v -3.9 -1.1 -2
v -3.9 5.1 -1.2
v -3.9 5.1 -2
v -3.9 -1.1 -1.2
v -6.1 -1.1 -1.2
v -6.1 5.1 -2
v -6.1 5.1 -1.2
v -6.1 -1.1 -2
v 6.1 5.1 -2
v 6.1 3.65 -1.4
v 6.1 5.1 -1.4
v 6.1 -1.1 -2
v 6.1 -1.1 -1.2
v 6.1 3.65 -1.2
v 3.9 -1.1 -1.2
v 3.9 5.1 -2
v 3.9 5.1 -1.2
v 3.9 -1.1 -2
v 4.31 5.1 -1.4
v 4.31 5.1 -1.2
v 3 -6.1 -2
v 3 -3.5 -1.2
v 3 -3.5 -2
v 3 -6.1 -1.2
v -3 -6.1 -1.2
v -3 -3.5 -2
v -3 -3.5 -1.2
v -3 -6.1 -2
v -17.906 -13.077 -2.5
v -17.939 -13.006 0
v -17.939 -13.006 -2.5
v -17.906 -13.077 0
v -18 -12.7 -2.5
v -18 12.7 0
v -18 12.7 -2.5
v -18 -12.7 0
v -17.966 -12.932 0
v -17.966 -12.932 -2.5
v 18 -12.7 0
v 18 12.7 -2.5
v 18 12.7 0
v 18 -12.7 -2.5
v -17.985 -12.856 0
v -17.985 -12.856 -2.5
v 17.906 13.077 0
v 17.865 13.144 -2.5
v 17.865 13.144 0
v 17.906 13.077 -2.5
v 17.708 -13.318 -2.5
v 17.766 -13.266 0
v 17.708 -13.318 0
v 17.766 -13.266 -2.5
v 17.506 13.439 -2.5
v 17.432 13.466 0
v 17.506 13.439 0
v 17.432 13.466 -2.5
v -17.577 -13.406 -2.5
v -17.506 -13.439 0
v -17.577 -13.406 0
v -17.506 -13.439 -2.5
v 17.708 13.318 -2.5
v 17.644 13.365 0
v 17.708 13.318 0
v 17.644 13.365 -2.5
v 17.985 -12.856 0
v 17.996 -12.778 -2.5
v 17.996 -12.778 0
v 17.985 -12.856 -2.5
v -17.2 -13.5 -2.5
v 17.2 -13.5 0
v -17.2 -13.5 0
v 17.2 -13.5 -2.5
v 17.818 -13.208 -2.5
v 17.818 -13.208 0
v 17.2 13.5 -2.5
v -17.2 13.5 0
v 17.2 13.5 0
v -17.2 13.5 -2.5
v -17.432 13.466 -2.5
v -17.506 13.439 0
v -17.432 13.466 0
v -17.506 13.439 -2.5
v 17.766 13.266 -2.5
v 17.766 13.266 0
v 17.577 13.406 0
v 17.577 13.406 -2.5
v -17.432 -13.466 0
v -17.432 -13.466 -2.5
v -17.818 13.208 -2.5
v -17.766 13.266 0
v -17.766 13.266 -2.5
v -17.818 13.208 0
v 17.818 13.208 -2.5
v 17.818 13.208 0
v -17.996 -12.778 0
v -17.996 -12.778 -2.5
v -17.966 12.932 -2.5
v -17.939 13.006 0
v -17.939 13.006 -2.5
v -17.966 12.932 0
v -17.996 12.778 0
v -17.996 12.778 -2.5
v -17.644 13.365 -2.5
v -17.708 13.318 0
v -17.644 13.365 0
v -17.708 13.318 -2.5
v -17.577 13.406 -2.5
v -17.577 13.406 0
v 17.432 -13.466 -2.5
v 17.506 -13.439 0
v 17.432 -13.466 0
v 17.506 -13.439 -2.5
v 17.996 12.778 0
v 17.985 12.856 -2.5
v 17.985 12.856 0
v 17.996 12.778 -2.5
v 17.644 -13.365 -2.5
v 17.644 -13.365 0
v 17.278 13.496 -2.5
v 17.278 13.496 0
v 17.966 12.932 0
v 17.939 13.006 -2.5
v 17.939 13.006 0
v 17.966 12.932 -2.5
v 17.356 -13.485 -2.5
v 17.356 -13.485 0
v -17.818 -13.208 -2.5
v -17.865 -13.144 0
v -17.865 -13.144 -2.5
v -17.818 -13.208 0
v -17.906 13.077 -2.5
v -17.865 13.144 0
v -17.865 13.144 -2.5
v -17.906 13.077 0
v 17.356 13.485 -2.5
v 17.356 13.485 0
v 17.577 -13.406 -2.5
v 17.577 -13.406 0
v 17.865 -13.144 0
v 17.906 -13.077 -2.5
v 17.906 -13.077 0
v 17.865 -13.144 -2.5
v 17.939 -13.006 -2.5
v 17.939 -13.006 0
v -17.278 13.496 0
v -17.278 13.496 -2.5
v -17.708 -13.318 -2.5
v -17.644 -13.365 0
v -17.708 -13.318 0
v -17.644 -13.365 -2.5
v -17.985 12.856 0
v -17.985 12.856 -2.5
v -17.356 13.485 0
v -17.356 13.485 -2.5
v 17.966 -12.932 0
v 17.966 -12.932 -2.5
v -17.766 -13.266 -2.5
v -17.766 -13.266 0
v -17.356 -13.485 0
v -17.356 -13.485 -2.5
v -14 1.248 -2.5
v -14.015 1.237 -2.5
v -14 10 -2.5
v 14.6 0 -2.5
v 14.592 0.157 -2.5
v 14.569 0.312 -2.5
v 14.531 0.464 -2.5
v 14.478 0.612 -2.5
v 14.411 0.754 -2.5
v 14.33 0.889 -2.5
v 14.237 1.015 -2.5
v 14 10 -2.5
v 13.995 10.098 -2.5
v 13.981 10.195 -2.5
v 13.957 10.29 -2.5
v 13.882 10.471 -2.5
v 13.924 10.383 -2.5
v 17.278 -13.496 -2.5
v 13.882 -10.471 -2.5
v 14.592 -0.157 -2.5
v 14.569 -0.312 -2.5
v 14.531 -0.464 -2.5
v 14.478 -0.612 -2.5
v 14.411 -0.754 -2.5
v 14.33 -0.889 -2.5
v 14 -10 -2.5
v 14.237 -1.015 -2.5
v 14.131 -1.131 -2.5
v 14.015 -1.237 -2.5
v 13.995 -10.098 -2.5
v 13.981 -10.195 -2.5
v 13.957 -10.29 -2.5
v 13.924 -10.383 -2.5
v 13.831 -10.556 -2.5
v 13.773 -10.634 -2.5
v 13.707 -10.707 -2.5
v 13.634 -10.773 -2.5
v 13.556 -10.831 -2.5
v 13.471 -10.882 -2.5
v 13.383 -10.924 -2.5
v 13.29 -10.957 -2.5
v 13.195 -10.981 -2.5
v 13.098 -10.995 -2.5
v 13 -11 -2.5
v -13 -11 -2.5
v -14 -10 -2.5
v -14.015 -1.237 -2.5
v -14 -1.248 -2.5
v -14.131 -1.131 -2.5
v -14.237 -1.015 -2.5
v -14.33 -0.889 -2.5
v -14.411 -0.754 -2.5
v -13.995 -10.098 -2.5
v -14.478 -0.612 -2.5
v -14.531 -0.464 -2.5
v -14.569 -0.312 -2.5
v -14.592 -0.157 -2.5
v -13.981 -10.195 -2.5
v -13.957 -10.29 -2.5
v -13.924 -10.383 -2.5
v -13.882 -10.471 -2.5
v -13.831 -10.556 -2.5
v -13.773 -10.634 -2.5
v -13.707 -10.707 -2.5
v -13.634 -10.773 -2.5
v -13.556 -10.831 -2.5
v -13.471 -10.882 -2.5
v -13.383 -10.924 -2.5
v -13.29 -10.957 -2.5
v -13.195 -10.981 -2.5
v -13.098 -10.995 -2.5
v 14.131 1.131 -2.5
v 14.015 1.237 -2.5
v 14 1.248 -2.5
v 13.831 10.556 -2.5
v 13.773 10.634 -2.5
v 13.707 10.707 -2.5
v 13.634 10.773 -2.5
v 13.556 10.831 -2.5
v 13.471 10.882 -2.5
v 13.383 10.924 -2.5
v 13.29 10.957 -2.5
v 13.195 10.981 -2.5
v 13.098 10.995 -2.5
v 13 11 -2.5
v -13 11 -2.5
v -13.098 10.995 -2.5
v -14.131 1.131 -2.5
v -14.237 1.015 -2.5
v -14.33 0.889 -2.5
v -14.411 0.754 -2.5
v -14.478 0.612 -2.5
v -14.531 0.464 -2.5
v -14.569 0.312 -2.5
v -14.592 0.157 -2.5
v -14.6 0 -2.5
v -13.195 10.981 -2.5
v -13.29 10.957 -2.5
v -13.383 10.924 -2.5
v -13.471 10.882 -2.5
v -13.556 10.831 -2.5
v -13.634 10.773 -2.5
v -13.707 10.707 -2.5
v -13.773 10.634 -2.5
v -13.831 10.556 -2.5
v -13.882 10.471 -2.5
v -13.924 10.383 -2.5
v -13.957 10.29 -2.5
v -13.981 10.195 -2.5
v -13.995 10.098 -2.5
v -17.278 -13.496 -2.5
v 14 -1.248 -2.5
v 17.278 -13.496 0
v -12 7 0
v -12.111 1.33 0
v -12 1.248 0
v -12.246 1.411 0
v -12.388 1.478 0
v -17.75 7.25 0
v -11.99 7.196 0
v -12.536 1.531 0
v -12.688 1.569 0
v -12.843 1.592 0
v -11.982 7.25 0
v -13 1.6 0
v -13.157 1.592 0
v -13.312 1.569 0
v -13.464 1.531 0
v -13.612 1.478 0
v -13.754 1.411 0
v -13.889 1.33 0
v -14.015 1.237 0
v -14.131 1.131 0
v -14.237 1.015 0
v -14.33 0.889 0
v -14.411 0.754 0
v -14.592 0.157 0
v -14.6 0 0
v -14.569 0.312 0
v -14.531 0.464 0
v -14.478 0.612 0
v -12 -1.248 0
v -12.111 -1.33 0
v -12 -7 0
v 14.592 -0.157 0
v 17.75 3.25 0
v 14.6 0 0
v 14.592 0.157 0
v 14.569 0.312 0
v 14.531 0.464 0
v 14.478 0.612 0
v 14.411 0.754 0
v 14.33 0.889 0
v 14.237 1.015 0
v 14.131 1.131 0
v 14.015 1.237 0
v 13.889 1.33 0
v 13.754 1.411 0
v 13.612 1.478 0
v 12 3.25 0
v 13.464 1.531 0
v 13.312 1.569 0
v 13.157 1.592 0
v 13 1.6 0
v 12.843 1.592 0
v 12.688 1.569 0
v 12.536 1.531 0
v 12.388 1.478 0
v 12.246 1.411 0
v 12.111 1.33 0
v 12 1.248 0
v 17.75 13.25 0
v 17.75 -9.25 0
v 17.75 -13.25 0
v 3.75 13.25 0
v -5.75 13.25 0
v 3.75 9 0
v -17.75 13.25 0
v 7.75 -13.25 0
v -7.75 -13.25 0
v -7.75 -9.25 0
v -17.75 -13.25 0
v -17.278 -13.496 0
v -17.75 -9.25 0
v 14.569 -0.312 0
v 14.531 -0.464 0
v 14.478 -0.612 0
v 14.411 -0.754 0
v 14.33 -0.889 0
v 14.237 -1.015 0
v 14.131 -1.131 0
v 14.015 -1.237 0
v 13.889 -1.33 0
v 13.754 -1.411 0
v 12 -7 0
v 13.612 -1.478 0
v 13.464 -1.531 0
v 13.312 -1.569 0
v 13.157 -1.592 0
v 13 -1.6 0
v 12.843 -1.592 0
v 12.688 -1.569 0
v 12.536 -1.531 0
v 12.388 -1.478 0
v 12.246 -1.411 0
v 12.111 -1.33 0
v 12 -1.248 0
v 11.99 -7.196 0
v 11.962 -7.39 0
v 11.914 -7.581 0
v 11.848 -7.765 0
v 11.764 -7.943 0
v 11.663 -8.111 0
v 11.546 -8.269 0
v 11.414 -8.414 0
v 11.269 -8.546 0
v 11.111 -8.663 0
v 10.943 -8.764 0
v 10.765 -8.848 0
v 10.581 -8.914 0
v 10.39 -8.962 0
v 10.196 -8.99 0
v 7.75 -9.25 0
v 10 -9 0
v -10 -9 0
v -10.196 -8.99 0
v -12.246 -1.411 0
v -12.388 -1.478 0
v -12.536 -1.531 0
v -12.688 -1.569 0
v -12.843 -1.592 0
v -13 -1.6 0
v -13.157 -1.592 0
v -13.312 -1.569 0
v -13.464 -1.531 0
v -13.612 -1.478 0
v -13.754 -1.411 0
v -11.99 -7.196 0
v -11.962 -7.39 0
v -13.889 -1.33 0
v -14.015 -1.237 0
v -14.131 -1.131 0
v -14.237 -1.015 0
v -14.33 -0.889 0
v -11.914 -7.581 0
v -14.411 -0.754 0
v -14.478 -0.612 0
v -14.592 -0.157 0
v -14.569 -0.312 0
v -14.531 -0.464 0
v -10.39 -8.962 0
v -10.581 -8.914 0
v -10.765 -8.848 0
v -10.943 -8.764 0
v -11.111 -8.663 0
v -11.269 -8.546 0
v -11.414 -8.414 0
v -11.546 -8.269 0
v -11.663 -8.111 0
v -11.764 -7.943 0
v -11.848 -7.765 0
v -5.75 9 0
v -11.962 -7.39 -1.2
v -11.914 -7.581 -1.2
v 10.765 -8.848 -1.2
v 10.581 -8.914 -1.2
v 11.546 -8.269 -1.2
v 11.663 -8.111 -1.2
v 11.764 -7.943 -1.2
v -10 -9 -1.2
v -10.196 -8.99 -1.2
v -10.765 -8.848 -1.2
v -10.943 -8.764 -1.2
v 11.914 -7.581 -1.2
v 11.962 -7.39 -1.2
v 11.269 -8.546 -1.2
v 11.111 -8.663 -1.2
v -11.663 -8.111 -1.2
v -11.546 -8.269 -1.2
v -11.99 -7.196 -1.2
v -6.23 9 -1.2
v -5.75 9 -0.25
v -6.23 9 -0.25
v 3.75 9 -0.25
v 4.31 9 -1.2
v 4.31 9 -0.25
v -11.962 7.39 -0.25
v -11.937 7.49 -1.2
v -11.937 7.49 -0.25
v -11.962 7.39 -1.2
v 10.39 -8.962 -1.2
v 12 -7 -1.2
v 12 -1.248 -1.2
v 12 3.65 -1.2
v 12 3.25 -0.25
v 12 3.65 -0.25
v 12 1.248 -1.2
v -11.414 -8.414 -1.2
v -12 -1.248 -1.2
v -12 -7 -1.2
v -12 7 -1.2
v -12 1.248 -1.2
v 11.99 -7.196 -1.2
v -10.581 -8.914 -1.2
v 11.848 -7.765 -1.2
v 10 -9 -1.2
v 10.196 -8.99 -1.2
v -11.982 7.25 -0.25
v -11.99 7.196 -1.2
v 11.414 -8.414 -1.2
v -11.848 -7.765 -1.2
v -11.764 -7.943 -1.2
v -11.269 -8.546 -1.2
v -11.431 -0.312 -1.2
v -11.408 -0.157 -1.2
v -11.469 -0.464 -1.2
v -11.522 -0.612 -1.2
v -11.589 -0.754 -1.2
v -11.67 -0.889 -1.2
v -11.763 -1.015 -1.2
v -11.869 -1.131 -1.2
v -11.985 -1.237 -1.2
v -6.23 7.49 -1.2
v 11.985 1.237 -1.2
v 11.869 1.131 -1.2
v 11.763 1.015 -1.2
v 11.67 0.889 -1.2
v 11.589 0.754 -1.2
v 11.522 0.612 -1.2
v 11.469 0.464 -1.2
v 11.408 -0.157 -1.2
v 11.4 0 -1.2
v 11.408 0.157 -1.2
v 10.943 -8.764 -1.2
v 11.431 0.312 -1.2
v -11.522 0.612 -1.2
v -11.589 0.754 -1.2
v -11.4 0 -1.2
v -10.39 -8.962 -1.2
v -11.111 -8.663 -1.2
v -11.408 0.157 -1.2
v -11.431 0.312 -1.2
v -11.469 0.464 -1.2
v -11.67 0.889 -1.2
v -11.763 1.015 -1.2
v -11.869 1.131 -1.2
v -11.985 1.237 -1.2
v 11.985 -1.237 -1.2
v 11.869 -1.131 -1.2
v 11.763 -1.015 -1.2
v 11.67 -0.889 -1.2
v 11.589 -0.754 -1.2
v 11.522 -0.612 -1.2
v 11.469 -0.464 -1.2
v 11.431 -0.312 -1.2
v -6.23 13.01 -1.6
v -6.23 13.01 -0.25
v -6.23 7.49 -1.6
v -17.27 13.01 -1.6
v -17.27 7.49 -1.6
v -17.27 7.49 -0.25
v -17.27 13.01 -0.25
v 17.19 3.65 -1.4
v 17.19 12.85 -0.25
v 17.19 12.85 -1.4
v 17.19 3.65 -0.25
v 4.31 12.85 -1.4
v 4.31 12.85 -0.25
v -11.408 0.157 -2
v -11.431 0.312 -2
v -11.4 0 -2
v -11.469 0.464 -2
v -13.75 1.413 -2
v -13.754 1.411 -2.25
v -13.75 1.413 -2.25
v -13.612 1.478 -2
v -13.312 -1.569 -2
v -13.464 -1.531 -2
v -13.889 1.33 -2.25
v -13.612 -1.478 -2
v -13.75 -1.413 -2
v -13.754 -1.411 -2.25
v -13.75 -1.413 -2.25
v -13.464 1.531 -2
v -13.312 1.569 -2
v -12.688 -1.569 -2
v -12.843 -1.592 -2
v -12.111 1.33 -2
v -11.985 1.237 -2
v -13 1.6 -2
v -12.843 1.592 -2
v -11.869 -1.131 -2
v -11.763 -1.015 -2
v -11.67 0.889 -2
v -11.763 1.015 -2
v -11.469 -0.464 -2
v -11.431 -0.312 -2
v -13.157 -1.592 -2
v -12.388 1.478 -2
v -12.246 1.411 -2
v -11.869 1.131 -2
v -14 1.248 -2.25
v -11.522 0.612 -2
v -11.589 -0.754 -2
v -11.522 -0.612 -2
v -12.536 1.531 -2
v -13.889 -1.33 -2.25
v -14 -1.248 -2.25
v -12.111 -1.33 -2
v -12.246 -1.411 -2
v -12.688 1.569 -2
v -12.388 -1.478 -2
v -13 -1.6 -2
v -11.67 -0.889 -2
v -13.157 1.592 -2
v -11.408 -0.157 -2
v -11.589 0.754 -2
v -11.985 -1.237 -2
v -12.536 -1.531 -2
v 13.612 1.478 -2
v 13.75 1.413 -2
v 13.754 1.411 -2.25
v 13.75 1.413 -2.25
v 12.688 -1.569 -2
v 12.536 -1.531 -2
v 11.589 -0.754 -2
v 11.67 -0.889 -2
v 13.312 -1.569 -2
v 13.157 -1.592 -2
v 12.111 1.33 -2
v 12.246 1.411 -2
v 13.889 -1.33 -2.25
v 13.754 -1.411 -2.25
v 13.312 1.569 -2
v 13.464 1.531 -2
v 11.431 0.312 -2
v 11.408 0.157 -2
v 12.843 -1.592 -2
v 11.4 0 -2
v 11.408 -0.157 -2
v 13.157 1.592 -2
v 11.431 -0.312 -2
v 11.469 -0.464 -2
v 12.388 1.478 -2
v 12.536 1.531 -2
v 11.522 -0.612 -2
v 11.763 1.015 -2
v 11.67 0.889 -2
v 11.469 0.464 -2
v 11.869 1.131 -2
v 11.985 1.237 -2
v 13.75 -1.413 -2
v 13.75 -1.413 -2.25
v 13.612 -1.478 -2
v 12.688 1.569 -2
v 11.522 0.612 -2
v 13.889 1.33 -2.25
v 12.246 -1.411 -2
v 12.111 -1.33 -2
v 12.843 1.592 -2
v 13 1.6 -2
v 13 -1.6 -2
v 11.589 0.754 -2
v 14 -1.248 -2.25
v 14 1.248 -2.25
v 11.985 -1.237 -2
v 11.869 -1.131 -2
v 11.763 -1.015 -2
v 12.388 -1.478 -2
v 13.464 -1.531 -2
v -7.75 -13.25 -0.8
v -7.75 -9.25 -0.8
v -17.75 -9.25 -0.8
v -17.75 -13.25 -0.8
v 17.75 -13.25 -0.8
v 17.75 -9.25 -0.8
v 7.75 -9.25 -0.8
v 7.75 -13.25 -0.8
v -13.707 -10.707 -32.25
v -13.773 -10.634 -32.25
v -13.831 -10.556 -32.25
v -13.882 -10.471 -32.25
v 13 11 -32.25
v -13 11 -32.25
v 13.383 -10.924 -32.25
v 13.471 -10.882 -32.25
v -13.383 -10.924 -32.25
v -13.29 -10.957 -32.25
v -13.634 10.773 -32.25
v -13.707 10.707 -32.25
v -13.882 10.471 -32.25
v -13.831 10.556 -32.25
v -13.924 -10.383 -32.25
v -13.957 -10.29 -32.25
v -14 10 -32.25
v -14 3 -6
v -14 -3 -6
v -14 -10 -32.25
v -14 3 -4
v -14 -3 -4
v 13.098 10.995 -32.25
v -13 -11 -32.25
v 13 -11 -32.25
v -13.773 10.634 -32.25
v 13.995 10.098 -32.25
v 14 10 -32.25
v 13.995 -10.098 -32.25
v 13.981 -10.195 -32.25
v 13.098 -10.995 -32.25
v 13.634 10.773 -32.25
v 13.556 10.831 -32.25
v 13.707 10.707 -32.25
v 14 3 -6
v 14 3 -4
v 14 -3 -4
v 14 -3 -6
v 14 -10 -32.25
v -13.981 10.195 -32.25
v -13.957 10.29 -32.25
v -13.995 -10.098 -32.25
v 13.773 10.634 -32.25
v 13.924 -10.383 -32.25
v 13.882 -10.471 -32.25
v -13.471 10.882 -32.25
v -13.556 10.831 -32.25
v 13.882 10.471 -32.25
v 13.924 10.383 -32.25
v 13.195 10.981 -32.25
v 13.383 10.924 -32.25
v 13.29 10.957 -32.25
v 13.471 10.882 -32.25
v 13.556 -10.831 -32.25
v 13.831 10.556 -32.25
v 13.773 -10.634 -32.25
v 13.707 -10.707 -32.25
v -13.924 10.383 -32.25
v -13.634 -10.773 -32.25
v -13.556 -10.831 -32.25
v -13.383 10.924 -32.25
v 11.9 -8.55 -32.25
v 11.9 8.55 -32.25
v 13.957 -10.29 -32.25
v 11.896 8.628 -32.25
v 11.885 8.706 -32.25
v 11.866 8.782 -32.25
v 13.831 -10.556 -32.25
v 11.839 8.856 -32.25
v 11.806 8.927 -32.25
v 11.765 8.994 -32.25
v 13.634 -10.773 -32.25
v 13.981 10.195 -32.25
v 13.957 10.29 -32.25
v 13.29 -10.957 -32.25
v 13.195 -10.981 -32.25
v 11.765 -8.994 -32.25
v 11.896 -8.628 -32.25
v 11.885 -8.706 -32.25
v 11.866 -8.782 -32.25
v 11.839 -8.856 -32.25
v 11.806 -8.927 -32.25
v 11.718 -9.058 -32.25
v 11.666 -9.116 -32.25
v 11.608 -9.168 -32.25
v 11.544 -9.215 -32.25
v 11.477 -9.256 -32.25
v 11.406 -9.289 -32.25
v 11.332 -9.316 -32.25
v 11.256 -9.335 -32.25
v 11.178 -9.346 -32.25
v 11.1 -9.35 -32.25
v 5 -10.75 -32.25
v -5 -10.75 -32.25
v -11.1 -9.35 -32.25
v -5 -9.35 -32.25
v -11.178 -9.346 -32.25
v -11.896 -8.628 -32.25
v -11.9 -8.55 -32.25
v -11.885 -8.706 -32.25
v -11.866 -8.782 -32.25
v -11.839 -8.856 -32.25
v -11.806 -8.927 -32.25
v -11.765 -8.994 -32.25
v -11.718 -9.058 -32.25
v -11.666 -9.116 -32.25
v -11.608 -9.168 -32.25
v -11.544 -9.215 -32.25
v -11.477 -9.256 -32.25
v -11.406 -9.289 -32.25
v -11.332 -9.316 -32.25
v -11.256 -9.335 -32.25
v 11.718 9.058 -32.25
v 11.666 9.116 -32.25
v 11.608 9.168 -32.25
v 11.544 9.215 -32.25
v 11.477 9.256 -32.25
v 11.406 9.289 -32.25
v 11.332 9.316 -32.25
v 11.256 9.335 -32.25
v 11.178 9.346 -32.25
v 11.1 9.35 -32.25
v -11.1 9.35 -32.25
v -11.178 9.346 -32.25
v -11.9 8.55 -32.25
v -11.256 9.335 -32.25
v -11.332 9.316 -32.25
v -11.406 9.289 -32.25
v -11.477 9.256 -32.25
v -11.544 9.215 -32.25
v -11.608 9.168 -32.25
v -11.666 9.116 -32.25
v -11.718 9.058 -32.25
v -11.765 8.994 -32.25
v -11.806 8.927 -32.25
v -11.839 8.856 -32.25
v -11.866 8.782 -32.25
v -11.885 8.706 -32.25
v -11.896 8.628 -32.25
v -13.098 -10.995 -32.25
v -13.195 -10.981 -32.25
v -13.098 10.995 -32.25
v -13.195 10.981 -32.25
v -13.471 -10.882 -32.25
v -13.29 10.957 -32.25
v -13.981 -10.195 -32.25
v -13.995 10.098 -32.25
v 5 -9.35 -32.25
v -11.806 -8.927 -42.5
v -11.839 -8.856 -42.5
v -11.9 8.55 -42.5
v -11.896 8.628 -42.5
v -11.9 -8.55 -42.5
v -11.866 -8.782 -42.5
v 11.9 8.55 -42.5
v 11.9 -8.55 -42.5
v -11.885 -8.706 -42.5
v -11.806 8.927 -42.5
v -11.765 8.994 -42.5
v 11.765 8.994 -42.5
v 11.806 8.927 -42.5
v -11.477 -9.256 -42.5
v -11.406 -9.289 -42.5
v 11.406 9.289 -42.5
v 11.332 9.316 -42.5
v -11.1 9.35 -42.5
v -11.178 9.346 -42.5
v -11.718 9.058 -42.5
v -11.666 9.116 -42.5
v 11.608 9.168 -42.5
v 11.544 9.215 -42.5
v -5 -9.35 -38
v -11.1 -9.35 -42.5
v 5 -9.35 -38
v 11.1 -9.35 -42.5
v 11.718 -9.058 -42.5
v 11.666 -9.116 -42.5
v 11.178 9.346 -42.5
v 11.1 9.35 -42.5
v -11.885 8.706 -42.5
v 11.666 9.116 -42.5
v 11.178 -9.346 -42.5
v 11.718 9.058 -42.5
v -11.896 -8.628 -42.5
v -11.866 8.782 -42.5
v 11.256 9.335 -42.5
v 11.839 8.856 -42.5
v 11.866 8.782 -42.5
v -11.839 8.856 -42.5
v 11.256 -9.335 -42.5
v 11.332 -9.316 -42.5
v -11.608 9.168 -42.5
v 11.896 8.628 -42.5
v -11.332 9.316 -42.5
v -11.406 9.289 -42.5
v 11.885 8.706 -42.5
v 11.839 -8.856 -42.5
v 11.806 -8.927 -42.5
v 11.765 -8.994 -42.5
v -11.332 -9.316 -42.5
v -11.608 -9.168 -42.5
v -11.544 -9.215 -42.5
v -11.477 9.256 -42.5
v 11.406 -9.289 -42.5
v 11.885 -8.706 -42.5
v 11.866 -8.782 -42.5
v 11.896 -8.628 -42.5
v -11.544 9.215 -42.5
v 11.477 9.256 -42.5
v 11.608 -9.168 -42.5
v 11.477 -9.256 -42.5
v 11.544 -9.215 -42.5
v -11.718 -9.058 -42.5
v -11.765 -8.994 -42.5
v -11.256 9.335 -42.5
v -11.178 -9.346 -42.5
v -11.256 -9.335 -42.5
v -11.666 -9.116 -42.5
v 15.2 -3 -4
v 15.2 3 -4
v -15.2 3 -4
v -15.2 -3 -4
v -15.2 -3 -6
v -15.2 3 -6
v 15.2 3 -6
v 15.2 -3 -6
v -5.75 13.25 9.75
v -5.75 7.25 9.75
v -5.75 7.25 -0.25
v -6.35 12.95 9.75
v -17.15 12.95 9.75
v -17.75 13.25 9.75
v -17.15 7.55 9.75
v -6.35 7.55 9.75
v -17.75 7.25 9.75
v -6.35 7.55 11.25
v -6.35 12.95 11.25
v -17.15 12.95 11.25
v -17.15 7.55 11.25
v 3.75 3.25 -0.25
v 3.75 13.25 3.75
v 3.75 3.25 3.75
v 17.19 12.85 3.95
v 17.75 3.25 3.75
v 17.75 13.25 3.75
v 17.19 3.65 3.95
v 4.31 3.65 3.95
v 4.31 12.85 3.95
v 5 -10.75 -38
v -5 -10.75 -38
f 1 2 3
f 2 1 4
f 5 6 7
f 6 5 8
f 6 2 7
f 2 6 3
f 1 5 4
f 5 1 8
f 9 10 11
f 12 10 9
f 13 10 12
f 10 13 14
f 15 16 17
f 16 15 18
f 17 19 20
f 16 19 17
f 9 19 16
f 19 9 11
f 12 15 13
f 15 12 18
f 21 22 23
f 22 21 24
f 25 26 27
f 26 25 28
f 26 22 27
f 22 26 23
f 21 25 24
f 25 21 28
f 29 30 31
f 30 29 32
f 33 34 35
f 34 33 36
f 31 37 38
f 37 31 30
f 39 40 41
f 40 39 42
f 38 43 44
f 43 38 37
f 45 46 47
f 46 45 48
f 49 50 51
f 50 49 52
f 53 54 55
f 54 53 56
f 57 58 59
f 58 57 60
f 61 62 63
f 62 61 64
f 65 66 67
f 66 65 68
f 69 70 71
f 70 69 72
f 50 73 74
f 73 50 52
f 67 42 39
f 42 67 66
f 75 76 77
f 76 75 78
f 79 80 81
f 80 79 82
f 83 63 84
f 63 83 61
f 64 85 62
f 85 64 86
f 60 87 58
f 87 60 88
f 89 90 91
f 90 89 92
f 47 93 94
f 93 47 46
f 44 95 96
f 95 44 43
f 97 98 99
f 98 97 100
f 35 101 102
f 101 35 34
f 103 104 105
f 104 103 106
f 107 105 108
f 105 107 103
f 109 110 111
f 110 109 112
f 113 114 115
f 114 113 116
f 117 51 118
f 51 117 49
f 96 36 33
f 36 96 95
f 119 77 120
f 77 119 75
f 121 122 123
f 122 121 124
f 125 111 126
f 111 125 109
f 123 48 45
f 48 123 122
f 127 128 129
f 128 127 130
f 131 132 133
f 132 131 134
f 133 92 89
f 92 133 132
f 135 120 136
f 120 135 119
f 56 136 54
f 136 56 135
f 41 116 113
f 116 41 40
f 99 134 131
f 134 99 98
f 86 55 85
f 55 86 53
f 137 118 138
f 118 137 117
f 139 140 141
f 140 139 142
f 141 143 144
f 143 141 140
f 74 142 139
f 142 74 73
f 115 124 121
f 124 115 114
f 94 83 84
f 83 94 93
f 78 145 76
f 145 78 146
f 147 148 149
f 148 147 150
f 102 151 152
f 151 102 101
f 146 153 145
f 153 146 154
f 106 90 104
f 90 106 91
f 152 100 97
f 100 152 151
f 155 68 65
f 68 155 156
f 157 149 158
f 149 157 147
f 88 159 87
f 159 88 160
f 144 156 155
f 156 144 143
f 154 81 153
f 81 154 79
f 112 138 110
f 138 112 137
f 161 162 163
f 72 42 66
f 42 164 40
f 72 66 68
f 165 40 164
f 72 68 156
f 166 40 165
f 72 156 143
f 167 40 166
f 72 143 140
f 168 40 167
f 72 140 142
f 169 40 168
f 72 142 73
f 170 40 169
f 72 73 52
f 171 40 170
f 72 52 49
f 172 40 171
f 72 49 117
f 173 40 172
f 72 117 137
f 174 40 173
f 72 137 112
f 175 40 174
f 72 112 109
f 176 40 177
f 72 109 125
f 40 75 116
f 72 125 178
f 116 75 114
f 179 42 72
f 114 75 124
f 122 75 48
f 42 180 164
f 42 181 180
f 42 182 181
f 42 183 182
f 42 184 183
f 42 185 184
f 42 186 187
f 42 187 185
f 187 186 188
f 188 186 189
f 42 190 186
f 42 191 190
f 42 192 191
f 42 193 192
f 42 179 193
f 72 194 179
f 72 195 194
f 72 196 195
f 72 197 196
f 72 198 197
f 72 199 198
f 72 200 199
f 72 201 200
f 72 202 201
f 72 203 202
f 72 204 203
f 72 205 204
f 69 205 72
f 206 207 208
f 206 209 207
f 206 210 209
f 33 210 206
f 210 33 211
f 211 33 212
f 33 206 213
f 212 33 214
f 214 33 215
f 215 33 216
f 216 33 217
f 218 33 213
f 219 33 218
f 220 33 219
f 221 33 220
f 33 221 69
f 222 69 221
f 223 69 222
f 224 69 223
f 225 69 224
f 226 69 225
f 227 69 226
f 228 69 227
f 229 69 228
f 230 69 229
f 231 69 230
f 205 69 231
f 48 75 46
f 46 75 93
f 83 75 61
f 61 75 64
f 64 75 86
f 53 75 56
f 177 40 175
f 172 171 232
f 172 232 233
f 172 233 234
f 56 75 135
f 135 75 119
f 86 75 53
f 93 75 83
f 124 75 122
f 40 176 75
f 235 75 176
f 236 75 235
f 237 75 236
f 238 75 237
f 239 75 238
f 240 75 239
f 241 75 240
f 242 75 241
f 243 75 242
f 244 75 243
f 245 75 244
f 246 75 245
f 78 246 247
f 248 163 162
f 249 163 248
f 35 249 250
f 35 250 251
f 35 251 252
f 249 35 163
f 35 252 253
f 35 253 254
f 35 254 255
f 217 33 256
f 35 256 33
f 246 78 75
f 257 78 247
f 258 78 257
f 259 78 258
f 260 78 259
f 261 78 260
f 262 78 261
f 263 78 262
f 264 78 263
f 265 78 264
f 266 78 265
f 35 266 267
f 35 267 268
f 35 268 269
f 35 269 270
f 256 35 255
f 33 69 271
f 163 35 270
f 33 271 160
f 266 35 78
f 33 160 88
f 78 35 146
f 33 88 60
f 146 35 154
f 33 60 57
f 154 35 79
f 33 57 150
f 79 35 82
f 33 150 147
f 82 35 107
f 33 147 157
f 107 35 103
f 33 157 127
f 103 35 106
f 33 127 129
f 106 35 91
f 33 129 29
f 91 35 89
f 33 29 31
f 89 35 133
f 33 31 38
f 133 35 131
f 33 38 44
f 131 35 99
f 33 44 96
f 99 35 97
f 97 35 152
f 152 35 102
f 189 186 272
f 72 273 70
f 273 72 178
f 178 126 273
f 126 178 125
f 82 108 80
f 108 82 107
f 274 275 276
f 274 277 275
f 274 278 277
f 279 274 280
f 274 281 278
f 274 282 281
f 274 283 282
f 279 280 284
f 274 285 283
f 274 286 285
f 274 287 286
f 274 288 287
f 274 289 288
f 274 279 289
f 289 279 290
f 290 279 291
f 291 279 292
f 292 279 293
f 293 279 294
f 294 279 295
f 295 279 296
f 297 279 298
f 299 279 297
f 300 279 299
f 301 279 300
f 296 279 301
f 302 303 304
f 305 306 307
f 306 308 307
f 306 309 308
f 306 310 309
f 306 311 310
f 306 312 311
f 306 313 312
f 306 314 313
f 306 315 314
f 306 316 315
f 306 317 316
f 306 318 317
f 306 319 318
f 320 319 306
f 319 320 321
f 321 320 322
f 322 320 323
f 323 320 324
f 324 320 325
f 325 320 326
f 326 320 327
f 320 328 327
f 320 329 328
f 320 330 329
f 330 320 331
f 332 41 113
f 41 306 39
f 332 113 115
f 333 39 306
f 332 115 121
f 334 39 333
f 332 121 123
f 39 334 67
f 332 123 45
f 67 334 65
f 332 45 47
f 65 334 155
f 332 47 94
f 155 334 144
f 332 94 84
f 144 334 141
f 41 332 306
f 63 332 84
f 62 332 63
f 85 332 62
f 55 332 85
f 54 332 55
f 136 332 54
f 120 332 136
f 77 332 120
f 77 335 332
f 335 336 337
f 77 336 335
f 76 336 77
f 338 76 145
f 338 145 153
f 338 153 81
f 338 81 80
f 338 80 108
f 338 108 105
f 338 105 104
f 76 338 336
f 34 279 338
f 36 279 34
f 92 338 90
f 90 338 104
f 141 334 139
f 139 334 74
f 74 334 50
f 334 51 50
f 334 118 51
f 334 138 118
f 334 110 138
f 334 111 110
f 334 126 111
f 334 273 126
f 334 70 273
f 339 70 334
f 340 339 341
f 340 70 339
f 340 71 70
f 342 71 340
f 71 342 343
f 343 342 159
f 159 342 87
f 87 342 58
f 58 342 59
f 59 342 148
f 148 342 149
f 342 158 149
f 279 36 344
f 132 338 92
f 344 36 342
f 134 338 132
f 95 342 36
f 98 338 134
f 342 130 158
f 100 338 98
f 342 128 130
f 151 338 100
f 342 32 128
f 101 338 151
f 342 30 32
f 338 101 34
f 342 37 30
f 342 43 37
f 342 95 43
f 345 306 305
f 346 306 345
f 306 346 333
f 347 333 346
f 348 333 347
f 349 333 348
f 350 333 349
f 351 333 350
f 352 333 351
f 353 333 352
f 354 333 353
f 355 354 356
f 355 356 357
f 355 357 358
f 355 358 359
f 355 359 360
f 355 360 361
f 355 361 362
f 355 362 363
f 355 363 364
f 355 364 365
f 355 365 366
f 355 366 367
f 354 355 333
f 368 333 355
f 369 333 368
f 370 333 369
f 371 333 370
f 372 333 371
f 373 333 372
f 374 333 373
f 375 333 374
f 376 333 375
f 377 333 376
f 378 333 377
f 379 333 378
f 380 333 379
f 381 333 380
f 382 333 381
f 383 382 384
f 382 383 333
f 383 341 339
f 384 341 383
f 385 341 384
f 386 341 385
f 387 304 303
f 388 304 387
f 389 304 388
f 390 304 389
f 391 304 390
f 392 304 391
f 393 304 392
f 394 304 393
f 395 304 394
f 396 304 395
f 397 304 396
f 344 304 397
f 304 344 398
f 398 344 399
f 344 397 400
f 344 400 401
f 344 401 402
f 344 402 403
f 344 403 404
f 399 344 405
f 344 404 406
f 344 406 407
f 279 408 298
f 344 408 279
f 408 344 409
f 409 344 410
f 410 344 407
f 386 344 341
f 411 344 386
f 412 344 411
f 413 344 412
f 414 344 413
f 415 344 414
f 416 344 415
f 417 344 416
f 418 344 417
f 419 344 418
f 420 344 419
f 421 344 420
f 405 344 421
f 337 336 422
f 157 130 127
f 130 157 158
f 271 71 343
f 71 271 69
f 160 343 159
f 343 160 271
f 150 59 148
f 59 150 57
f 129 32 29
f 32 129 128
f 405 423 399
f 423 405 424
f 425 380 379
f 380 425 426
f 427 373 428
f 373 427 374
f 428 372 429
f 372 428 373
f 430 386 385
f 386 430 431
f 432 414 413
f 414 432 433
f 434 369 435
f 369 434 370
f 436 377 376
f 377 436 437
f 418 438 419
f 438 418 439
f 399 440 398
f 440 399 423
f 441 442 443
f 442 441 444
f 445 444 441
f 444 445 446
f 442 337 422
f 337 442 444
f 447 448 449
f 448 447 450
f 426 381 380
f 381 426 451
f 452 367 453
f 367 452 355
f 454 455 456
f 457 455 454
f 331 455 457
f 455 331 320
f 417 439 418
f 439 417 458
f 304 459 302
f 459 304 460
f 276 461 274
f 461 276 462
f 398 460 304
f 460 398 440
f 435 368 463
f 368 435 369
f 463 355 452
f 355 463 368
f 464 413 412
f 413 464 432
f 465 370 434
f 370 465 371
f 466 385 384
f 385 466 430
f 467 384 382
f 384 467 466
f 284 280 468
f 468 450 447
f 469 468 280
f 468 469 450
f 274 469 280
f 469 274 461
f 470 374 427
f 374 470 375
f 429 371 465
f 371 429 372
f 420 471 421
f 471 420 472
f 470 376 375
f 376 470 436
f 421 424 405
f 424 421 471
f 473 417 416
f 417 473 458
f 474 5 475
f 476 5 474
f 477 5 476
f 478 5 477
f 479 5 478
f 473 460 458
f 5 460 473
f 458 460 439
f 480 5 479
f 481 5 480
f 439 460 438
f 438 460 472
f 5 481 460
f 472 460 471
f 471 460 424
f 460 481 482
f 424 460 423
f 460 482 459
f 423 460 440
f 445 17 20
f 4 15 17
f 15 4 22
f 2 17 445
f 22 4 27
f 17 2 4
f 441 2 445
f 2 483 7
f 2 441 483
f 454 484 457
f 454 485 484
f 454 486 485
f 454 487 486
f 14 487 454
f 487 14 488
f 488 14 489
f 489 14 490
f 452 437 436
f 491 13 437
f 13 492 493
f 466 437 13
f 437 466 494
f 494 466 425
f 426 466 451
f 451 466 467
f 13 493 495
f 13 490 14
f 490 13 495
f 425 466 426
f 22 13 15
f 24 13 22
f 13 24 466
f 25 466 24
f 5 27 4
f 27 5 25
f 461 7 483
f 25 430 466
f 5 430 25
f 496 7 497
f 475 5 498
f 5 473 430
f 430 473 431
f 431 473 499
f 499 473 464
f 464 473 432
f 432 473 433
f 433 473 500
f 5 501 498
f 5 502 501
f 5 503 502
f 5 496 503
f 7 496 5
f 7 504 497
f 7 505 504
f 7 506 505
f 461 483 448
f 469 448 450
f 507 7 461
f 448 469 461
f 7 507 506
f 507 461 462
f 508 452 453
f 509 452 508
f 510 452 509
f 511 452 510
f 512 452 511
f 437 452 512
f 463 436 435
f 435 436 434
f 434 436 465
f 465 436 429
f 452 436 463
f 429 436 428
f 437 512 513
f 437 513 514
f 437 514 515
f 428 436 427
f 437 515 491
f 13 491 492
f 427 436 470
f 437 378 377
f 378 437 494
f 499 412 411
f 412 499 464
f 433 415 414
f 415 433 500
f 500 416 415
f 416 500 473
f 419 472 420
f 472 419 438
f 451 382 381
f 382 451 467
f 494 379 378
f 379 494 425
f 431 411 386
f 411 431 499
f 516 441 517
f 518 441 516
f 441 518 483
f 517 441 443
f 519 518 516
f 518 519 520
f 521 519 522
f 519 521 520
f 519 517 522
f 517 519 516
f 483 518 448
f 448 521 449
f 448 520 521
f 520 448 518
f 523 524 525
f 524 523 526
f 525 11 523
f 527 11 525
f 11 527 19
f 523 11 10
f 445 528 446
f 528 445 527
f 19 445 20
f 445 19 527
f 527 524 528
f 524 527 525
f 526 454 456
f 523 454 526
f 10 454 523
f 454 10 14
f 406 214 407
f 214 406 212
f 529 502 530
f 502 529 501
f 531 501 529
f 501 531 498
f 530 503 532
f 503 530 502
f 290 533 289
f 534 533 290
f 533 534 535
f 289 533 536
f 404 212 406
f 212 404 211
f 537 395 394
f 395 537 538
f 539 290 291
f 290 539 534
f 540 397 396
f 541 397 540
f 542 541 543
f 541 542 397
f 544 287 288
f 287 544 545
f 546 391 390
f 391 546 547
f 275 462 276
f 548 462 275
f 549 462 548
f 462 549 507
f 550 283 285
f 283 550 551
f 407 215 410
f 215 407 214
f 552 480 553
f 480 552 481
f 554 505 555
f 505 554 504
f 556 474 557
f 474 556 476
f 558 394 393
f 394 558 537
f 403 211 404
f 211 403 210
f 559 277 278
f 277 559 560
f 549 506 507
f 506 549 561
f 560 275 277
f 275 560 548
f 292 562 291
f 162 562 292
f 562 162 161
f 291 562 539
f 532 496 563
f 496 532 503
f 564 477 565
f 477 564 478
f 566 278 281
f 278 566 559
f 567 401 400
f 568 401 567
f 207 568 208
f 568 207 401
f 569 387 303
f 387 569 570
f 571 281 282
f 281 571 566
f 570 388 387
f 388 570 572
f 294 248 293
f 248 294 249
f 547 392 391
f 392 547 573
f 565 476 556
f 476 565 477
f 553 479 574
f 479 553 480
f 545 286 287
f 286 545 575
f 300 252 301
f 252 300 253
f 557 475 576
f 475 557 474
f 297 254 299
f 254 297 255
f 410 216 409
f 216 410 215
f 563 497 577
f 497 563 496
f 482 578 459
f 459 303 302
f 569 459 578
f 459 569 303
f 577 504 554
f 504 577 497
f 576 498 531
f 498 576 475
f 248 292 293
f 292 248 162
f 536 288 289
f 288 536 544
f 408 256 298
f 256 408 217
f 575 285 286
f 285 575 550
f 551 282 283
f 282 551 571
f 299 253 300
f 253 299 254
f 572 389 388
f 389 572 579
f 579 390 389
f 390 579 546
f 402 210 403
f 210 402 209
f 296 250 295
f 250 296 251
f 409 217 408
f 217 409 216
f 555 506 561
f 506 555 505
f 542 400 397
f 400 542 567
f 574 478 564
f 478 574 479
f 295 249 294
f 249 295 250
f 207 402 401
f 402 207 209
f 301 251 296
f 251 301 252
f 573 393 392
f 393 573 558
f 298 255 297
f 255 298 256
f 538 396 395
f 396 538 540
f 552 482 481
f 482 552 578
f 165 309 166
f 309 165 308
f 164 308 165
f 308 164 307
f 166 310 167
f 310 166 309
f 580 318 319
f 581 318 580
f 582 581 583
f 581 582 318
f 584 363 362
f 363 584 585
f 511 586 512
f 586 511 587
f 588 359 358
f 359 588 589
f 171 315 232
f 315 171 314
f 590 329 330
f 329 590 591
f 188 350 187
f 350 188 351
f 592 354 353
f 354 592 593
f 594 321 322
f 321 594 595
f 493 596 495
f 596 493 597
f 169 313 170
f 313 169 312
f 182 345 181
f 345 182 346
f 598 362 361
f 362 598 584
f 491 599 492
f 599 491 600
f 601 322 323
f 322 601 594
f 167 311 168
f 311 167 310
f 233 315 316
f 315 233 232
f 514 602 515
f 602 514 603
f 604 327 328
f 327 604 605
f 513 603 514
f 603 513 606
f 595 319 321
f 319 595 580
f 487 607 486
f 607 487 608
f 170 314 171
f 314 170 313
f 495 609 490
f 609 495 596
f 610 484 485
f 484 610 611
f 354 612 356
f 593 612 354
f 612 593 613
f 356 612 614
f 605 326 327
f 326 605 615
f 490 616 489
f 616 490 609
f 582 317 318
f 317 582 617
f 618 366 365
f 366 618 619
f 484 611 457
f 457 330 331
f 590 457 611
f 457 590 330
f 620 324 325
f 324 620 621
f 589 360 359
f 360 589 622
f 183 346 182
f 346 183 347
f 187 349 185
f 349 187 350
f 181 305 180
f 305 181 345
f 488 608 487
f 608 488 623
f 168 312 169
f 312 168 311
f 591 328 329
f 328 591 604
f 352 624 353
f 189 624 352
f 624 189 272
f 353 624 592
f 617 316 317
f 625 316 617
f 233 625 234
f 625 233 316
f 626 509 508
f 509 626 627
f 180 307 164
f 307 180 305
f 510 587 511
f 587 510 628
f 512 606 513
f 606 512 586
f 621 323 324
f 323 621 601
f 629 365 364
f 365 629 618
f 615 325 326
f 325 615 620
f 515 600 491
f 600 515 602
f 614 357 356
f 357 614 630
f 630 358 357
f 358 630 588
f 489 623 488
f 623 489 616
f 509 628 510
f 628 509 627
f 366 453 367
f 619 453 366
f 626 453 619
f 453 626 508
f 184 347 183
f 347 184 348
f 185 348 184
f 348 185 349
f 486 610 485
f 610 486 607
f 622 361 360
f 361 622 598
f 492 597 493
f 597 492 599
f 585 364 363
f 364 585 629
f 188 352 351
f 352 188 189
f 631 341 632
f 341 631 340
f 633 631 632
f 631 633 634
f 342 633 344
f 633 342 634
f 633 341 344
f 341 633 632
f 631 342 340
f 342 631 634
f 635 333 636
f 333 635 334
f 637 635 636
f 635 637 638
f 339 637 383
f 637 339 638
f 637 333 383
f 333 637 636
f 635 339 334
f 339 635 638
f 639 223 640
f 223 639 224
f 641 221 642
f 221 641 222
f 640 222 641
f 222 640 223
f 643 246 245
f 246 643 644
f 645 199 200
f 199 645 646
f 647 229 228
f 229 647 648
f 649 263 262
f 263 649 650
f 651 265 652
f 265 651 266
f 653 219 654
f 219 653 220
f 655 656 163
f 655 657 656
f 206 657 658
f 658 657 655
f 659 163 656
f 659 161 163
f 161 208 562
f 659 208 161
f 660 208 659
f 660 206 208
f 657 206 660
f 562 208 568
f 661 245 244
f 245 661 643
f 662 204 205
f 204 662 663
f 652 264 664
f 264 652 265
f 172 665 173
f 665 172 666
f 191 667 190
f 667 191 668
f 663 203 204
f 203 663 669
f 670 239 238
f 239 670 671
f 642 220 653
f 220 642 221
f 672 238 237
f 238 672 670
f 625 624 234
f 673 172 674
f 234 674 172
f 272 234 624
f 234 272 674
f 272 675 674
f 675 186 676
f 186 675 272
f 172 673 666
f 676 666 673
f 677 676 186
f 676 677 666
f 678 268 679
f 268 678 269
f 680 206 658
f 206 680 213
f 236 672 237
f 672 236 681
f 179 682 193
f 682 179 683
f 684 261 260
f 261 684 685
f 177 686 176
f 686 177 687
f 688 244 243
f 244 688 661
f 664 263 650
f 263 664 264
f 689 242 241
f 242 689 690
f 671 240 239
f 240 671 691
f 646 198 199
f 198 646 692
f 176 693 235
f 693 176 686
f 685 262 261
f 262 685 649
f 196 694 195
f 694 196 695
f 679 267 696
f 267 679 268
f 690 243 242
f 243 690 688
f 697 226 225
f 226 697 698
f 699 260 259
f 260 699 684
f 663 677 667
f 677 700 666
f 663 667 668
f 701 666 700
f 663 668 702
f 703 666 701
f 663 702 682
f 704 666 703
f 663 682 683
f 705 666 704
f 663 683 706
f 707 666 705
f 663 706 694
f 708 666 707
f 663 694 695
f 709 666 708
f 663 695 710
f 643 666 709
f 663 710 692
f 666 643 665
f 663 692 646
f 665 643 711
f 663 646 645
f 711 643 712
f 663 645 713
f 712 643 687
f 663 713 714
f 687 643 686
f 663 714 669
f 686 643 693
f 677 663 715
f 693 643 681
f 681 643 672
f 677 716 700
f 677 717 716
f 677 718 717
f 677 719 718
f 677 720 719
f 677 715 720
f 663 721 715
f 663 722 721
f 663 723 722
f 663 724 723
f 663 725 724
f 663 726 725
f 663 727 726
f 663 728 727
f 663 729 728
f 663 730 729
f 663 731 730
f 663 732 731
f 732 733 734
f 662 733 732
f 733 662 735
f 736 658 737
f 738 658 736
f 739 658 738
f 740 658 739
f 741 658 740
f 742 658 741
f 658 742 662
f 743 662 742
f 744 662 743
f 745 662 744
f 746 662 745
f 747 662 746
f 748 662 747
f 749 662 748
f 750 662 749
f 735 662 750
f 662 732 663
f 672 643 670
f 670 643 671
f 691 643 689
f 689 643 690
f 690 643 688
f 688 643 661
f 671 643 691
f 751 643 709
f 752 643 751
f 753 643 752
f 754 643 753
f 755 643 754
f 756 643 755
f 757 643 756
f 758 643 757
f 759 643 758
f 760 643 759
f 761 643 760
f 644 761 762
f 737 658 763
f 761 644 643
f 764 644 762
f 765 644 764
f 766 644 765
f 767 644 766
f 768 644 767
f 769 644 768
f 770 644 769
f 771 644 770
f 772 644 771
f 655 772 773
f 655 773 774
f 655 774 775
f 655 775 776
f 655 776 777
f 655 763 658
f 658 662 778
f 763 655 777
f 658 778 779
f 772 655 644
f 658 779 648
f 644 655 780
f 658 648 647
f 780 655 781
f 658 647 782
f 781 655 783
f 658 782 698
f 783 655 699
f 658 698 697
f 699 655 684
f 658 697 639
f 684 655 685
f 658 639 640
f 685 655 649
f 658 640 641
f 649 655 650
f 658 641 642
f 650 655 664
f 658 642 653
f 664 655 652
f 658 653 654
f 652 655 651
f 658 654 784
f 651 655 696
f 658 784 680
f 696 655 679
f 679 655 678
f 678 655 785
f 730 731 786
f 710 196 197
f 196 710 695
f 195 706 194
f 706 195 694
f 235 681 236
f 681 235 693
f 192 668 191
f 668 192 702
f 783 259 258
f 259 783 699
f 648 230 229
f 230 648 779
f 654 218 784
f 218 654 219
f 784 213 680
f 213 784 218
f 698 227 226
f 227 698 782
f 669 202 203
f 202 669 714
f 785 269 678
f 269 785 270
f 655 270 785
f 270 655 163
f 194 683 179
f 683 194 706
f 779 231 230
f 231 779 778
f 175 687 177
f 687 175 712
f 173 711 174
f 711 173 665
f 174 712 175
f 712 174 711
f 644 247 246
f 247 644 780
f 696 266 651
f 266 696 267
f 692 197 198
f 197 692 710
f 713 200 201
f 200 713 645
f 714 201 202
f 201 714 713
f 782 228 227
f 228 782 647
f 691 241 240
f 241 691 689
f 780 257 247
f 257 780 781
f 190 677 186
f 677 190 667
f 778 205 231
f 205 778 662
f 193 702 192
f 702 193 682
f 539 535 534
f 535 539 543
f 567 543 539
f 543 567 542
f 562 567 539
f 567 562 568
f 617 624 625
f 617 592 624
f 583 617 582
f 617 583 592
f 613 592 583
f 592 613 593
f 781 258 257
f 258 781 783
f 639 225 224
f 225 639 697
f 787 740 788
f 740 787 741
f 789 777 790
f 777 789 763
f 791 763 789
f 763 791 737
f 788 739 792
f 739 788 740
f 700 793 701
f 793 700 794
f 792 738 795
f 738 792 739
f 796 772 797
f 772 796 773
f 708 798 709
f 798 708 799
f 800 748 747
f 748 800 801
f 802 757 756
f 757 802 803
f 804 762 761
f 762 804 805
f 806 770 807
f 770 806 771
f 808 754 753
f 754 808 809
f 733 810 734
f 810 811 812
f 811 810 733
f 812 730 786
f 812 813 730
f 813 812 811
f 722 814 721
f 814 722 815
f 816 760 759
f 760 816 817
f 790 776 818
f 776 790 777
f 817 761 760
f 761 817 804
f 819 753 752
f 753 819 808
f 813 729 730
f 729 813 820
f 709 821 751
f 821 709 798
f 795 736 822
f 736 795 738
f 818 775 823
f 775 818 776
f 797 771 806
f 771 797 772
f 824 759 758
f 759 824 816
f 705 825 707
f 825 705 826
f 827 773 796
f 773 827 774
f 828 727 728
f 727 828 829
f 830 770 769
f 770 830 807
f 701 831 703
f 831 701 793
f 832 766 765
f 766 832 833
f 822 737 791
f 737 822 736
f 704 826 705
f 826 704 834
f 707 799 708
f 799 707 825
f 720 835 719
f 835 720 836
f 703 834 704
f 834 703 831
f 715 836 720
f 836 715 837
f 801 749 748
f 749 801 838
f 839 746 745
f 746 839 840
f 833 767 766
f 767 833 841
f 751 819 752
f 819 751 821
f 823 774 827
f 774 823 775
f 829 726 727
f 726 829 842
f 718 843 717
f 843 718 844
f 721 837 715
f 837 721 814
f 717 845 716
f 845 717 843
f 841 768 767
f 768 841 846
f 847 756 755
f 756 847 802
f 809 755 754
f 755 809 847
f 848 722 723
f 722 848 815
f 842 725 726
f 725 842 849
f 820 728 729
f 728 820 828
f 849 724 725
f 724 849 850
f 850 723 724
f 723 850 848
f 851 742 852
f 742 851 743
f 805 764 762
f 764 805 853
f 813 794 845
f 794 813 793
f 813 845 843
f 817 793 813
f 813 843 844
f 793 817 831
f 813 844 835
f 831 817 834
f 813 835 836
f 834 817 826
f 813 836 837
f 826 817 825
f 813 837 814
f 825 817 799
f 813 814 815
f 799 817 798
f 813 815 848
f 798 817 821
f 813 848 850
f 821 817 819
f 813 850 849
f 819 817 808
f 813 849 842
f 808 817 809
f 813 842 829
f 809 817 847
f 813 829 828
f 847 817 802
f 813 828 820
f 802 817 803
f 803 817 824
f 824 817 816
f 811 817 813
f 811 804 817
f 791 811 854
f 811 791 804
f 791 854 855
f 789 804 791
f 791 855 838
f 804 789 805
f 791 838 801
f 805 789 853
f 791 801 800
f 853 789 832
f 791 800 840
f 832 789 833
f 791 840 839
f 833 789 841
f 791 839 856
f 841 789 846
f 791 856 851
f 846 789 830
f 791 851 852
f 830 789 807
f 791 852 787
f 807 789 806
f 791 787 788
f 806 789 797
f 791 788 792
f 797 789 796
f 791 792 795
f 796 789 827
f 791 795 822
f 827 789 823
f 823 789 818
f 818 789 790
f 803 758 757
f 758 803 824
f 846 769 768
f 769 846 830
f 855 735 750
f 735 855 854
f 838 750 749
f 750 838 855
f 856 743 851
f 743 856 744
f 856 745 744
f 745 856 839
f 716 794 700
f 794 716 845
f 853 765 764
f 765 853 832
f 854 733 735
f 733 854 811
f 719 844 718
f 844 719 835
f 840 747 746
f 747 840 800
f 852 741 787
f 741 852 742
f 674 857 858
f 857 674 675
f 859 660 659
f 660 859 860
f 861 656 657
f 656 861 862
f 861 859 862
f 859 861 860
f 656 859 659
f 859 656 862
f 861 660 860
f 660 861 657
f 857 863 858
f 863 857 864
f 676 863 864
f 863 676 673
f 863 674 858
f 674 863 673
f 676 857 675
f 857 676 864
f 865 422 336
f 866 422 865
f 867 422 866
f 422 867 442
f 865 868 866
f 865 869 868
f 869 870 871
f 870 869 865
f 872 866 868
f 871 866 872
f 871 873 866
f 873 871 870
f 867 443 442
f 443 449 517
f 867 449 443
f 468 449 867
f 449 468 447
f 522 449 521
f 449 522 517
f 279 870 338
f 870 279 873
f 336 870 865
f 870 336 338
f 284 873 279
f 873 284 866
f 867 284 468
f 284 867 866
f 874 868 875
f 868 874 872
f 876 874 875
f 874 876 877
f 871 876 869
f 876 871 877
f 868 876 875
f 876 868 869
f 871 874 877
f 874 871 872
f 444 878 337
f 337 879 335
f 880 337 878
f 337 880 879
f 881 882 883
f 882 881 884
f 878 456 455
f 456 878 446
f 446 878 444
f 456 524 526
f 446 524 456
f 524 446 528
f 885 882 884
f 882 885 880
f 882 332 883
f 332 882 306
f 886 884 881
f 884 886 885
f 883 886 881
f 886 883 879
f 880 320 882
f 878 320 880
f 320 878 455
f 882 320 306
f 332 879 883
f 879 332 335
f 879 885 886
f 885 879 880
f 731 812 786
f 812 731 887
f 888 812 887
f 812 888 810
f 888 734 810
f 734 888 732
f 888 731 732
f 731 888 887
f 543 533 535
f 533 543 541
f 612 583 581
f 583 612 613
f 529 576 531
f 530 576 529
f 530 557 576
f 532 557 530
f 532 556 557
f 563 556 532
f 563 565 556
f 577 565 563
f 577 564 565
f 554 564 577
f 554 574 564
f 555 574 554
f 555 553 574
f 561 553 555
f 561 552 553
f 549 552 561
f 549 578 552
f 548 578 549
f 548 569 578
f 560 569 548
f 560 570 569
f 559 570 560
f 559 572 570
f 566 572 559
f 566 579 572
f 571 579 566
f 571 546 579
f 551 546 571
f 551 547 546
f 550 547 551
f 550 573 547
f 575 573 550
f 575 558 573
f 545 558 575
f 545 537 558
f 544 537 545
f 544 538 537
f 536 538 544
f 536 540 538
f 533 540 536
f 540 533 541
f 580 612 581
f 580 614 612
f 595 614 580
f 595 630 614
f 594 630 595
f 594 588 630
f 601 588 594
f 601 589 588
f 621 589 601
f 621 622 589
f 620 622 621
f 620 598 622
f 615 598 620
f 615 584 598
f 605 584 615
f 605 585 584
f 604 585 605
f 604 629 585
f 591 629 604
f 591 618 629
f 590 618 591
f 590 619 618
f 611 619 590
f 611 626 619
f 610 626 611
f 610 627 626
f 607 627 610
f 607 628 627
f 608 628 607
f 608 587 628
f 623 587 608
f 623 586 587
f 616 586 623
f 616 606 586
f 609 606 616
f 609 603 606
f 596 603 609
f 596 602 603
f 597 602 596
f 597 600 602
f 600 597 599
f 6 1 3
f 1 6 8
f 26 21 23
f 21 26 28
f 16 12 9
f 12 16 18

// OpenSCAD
// IEC fused inlet (old style) - connected solid, overall face 36x27mm
// Fixes:
// - Adds recognizable IEC C14 face details (pin openings + earth slot + inner bezel recess)
// - Adds clearer fused inlet module features (fuse drawer pocket + cap lip, switch pocket + rocker)
// - Keeps overall faceplate size exactly 36.0 x 27.0 mm
// - Ensures ONE connected solid (all additive parts overlap main body/flange; all cutouts are subtractive)

$fn = 64;

// -------------------- Parameters --------------------
face_W = 36.0; //[18.0:72.0:0.5]
face_H = 27.0; //[13.5:54.0:0.5]
flange_t = 2.5; //[1.25:5.0:0.1]

body_D = 30.0; //[15.0:60.0:0.5]
body_W = 28.0; //[14.0:56.0:0.5]
body_H = 22.0; //[11.0:44.0:0.5]

panel_t = 2.0; //[1.0:4.0:0.1]
cutout_W = 27.5; //[13.75:55.0:0.5]
cutout_H = 20.5; //[10.25:41.0:0.5]

clip_W = 6.0; //[3.0:12.0:0.5]
clip_H = 2.0; //[1.0:4.0:0.1]
clip_overhang = 1.2; //[0.6:2.4:0.1]

eps = 0.25; //[0.1:1.0:0.05]

screw_hole_d = 3.2; //[2.0:6.0:0.1]
screw_edge_margin = 5.0; //[3.0:10.0:0.5]

fuse_W = 12.0; //[6.0:24.0:0.5]
fuse_H = 6.0; //[3.0:12.0:0.5]
fuse_D = 10.0; //[5.0:20.0:0.5]
fuse_cap_t = 1.5; //[0.8:3.0:0.1]

switch_W = 14.0; //[7.0:28.0:0.5]
switch_H = 10.0; //[5.0:20.0:0.5]
switch_D = 4.0; //[2.0:8.0:0.5]

blade_W = 6.3; //[3.0:12.6:0.1]
blade_T = 0.8; //[0.4:1.6:0.1]
blade_L = 10.0; //[5.0:20.0:0.5]

strain_W = 10.0; //[5.0:20.0:0.5]
strain_H = 6.0; //[3.0:12.0:0.5]
strain_D = 6.0; //[3.0:12.0:0.5]

label_W = 10.0; //[5.0:20.0:0.5]
label_H = 4.0; //[2.0:8.0:0.5]
label_depth = 0.8; //[0.4:1.6:0.1]

chamfer = 0.8; //[0.4:1.6:0.1]

// IEC C14 face detail parameters (visual, not a certified drawing)
iec_bezel_W = 24.0;
iec_bezel_H = 18.0;
iec_bezel_r = 2.0;
iec_bezel_recess = 1.2;     // recess depth into front face

pin_slot_W = 2.2;           // rectangular slot width
pin_slot_H = 6.2;           // rectangular slot height
pin_pitch = 10.0;           // L-N spacing
earth_slot_W = 6.0;
earth_slot_H = 2.6;
earth_y = -4.8;             // earth below pins

// -------------------- Helpers --------------------
module rrect2d(w,h,r){
  r2 = min(r, min(w,h)/2);
  hull(){
    for (sx=[-1,1], sy=[-1,1])
      translate([sx*(w/2-r2), sy*(h/2-r2)]) circle(r=r2);
  }
}

module rrect3d(w,h,t,r){
  linear_extrude(height=t, center=true) rrect2d(w,h,r);
}

// -------------------- Coordinate convention --------------------
// Front face outer surface at z=0, body extends to negative z.
z_flange_center = -flange_t/2;
z_body_center   = -(flange_t + body_D/2 - eps); // overlap into flange
z_body_front    = z_body_center + body_D/2;
z_body_back     = z_body_center - body_D/2;

// -------------------- Base solids --------------------
module front_faceplate_flange(){
  translate([0,0,z_flange_center])
    rrect3d(face_W, face_H, flange_t, chamfer);
}

module main_inlet_housing_body(){
  translate([0,0,z_body_center])
    rrect3d(body_W, body_H, body_D, 1.0);
}

module rear_body_extension(){
  ext_D = body_D*0.35;
  ext_W = body_W*0.85;
  ext_H = body_H*0.85;
  z_ext_center = z_body_back - ext_D/2 + eps; // overlap into main body
  translate([0,0,z_ext_center])
    rrect3d(ext_W, ext_H, ext_D, 0.8);
}

// -------------------- Subtractive details --------------------
module mounting_screw_hole(x){
  translate([x,0,z_flange_center])
    cylinder(d=screw_hole_d, h=flange_t + 2*eps, center=true);
}

module label_recess(x,y){
  translate([x,y,-label_depth/2 + eps])
    cube([label_W, label_H, label_depth + 2*eps], center=true);
}

// IEC bezel recess (gives recognizable inlet face depth)
module iec_bezel_recess(){
  // recess into front surface; keep within flange thickness
  t = min(iec_bezel_recess, flange_t - 0.3);
  translate([0,0,-t/2 + eps])
    rrect3d(iec_bezel_W, iec_bezel_H, t + 2*eps, iec_bezel_r);
}

// IEC pin openings (through flange and slightly into body)
module iec_pin_openings(){
  t = flange_t + 4*eps;

  // L and N slots (vertical rectangles)
  for (sx=[-1,1]){
    translate([sx*pin_pitch/2, 2.0, z_flange_center])
      cube([pin_slot_W, pin_slot_H, t], center=true);
  }

  // Earth slot (horizontal rectangle)
  translate([0, earth_y, z_flange_center])
    cube([earth_slot_W, earth_slot_H, t], center=true);
}

// Fuse drawer pocket (recess into front face)
module fuse_drawer_pocket(){
  x = -(face_W/2 - fuse_W/2 - eps);
  y =  (face_H/2 - fuse_H/2 - eps);

  // pocket depth into flange (not through)
  pocket_t = min(flange_t - 0.4, 1.6);
  translate([x,y,-pocket_t/2 + eps])
    cube([fuse_W*0.92, fuse_H*0.92, pocket_t + 2*eps], center=true);
}

// Switch pocket (recess into front face)
module switch_pocket(){
  x = (face_W/2 - switch_W/2 - eps);
  y = (face_H/2 - switch_H/2 - eps);

  pocket_t = min(flange_t - 0.4, 1.4);
  translate([x,y,-pocket_t/2 + eps])
    cube([switch_W*0.92, switch_H*0.92, pocket_t + 2*eps], center=true);
}

// -------------------- Additive features (must be connected) --------------------
module snap_in_retention_clip(side=1){
  // side = -1 left, +1 right
  x = side*(body_W/2 + clip_overhang/2 - eps);
  z = z_body_front - (panel_t + clip_H/2) + eps; // overlaps body
  translate([x,0,z])
    cube([clip_overhang + 2*eps, clip_W, clip_H], center=true);
}

module fuse_drawer(){
  // protruding outward (positive z) and overlapping flange
  x = -(face_W/2 - fuse_W/2 - eps);
  y =  (face_H/2 - fuse_H/2 - eps);
  z =  fuse_D/2 - eps; // overlaps front surface at z=0
  translate([x,y,z])
    cube([fuse_W, fuse_H, fuse_D], center=true);
}

module fuse_cap(){
  x = -(face_W/2 - fuse_W/2 - eps);
  y =  (face_H/2 - fuse_H/2 - eps);
  // cap overlaps drawer slightly to ensure connectivity
  z = fuse_D + fuse_cap_t/2 - 1.0*eps;
  translate([x,y,z])
    cube([fuse_W*0.9, fuse_H*0.9, fuse_cap_t], center=true);
}

module switch_rocker(){
  x = (face_W/2 - switch_W/2 - eps);
  y = (face_H/2 - switch_H/2 - eps);
  z = switch_D/2 - eps; // overlaps flange
  // slight top bevel via hull of two boxes
  translate([x,y,z])
    hull(){
      cube([switch_W, switch_H, switch_D], center=true);
      translate([0,0,switch_D*0.25])
        cube([switch_W*0.92, switch_H*0.92, switch_D*0.6], center=true);
    }
}

module terminal_blade(x,y){
  z = z_body_back - blade_L/2 + eps; // overlaps body back
  translate([x,y,z])
    cube([blade_T, blade_W, blade_L], center=true);
}

module strain_relief_features(){
  y = -(body_H/2 - strain_H/2 - eps);
  z = z_body_back - strain_D/2 + eps; // overlaps body
  translate([0,y,z])
    cube([strain_W, strain_H, strain_D], center=true);
}

// Connected reference "panel cutout" block (kept connected, not floating)
module panel_cutout_profile(){
  z_panel_center = z_body_front - panel_t/2 + eps; // overlaps body
  translate([0,0,z_panel_center])
    rrect3d(cutout_W, cutout_H, panel_t, 0.6);
}

// -------------------- Faceplate with holes/recesses --------------------
module faceplate_with_details(){
  difference(){
    front_faceplate_flange();

    // IEC face details
    iec_bezel_recess();
    iec_pin_openings();

    // Fuse + switch pockets
    fuse_drawer_pocket();
    switch_pocket();

    // Mounting holes
    mounting_screw_hole(-(face_W/2 - screw_edge_margin));
    mounting_screw_hole( (face_W/2 - screw_edge_margin));

    // Label recesses (bottom corners)
    label_recess(-(face_W/2 - label_W/2 - eps), -(face_H/2 - label_H/2 - eps));
    label_recess( (face_W/2 - label_W/2 - eps), -(face_H/2 - label_H/2 - eps));
  }
}

// -------------------- Final connected model --------------------
module complete_model(){
  union(){
    faceplate_with_details();
    main_inlet_housing_body();
    rear_body_extension();

    snap_in_retention_clip(-1);
    snap_in_retention_clip( 1);

    fuse_drawer();
    fuse_cap();
    switch_rocker();

    // Rear terminals (L, N, E) - all overlap body back
    terminal_blade(-pin_pitch/2,  0);
    terminal_blade( pin_pitch/2,  0);
    terminal_blade(0,            -pin_pitch/2);

    strain_relief_features();

    // Connected reference cutout block
    panel_cutout_profile();
  }
}

// Output
complete_model();
